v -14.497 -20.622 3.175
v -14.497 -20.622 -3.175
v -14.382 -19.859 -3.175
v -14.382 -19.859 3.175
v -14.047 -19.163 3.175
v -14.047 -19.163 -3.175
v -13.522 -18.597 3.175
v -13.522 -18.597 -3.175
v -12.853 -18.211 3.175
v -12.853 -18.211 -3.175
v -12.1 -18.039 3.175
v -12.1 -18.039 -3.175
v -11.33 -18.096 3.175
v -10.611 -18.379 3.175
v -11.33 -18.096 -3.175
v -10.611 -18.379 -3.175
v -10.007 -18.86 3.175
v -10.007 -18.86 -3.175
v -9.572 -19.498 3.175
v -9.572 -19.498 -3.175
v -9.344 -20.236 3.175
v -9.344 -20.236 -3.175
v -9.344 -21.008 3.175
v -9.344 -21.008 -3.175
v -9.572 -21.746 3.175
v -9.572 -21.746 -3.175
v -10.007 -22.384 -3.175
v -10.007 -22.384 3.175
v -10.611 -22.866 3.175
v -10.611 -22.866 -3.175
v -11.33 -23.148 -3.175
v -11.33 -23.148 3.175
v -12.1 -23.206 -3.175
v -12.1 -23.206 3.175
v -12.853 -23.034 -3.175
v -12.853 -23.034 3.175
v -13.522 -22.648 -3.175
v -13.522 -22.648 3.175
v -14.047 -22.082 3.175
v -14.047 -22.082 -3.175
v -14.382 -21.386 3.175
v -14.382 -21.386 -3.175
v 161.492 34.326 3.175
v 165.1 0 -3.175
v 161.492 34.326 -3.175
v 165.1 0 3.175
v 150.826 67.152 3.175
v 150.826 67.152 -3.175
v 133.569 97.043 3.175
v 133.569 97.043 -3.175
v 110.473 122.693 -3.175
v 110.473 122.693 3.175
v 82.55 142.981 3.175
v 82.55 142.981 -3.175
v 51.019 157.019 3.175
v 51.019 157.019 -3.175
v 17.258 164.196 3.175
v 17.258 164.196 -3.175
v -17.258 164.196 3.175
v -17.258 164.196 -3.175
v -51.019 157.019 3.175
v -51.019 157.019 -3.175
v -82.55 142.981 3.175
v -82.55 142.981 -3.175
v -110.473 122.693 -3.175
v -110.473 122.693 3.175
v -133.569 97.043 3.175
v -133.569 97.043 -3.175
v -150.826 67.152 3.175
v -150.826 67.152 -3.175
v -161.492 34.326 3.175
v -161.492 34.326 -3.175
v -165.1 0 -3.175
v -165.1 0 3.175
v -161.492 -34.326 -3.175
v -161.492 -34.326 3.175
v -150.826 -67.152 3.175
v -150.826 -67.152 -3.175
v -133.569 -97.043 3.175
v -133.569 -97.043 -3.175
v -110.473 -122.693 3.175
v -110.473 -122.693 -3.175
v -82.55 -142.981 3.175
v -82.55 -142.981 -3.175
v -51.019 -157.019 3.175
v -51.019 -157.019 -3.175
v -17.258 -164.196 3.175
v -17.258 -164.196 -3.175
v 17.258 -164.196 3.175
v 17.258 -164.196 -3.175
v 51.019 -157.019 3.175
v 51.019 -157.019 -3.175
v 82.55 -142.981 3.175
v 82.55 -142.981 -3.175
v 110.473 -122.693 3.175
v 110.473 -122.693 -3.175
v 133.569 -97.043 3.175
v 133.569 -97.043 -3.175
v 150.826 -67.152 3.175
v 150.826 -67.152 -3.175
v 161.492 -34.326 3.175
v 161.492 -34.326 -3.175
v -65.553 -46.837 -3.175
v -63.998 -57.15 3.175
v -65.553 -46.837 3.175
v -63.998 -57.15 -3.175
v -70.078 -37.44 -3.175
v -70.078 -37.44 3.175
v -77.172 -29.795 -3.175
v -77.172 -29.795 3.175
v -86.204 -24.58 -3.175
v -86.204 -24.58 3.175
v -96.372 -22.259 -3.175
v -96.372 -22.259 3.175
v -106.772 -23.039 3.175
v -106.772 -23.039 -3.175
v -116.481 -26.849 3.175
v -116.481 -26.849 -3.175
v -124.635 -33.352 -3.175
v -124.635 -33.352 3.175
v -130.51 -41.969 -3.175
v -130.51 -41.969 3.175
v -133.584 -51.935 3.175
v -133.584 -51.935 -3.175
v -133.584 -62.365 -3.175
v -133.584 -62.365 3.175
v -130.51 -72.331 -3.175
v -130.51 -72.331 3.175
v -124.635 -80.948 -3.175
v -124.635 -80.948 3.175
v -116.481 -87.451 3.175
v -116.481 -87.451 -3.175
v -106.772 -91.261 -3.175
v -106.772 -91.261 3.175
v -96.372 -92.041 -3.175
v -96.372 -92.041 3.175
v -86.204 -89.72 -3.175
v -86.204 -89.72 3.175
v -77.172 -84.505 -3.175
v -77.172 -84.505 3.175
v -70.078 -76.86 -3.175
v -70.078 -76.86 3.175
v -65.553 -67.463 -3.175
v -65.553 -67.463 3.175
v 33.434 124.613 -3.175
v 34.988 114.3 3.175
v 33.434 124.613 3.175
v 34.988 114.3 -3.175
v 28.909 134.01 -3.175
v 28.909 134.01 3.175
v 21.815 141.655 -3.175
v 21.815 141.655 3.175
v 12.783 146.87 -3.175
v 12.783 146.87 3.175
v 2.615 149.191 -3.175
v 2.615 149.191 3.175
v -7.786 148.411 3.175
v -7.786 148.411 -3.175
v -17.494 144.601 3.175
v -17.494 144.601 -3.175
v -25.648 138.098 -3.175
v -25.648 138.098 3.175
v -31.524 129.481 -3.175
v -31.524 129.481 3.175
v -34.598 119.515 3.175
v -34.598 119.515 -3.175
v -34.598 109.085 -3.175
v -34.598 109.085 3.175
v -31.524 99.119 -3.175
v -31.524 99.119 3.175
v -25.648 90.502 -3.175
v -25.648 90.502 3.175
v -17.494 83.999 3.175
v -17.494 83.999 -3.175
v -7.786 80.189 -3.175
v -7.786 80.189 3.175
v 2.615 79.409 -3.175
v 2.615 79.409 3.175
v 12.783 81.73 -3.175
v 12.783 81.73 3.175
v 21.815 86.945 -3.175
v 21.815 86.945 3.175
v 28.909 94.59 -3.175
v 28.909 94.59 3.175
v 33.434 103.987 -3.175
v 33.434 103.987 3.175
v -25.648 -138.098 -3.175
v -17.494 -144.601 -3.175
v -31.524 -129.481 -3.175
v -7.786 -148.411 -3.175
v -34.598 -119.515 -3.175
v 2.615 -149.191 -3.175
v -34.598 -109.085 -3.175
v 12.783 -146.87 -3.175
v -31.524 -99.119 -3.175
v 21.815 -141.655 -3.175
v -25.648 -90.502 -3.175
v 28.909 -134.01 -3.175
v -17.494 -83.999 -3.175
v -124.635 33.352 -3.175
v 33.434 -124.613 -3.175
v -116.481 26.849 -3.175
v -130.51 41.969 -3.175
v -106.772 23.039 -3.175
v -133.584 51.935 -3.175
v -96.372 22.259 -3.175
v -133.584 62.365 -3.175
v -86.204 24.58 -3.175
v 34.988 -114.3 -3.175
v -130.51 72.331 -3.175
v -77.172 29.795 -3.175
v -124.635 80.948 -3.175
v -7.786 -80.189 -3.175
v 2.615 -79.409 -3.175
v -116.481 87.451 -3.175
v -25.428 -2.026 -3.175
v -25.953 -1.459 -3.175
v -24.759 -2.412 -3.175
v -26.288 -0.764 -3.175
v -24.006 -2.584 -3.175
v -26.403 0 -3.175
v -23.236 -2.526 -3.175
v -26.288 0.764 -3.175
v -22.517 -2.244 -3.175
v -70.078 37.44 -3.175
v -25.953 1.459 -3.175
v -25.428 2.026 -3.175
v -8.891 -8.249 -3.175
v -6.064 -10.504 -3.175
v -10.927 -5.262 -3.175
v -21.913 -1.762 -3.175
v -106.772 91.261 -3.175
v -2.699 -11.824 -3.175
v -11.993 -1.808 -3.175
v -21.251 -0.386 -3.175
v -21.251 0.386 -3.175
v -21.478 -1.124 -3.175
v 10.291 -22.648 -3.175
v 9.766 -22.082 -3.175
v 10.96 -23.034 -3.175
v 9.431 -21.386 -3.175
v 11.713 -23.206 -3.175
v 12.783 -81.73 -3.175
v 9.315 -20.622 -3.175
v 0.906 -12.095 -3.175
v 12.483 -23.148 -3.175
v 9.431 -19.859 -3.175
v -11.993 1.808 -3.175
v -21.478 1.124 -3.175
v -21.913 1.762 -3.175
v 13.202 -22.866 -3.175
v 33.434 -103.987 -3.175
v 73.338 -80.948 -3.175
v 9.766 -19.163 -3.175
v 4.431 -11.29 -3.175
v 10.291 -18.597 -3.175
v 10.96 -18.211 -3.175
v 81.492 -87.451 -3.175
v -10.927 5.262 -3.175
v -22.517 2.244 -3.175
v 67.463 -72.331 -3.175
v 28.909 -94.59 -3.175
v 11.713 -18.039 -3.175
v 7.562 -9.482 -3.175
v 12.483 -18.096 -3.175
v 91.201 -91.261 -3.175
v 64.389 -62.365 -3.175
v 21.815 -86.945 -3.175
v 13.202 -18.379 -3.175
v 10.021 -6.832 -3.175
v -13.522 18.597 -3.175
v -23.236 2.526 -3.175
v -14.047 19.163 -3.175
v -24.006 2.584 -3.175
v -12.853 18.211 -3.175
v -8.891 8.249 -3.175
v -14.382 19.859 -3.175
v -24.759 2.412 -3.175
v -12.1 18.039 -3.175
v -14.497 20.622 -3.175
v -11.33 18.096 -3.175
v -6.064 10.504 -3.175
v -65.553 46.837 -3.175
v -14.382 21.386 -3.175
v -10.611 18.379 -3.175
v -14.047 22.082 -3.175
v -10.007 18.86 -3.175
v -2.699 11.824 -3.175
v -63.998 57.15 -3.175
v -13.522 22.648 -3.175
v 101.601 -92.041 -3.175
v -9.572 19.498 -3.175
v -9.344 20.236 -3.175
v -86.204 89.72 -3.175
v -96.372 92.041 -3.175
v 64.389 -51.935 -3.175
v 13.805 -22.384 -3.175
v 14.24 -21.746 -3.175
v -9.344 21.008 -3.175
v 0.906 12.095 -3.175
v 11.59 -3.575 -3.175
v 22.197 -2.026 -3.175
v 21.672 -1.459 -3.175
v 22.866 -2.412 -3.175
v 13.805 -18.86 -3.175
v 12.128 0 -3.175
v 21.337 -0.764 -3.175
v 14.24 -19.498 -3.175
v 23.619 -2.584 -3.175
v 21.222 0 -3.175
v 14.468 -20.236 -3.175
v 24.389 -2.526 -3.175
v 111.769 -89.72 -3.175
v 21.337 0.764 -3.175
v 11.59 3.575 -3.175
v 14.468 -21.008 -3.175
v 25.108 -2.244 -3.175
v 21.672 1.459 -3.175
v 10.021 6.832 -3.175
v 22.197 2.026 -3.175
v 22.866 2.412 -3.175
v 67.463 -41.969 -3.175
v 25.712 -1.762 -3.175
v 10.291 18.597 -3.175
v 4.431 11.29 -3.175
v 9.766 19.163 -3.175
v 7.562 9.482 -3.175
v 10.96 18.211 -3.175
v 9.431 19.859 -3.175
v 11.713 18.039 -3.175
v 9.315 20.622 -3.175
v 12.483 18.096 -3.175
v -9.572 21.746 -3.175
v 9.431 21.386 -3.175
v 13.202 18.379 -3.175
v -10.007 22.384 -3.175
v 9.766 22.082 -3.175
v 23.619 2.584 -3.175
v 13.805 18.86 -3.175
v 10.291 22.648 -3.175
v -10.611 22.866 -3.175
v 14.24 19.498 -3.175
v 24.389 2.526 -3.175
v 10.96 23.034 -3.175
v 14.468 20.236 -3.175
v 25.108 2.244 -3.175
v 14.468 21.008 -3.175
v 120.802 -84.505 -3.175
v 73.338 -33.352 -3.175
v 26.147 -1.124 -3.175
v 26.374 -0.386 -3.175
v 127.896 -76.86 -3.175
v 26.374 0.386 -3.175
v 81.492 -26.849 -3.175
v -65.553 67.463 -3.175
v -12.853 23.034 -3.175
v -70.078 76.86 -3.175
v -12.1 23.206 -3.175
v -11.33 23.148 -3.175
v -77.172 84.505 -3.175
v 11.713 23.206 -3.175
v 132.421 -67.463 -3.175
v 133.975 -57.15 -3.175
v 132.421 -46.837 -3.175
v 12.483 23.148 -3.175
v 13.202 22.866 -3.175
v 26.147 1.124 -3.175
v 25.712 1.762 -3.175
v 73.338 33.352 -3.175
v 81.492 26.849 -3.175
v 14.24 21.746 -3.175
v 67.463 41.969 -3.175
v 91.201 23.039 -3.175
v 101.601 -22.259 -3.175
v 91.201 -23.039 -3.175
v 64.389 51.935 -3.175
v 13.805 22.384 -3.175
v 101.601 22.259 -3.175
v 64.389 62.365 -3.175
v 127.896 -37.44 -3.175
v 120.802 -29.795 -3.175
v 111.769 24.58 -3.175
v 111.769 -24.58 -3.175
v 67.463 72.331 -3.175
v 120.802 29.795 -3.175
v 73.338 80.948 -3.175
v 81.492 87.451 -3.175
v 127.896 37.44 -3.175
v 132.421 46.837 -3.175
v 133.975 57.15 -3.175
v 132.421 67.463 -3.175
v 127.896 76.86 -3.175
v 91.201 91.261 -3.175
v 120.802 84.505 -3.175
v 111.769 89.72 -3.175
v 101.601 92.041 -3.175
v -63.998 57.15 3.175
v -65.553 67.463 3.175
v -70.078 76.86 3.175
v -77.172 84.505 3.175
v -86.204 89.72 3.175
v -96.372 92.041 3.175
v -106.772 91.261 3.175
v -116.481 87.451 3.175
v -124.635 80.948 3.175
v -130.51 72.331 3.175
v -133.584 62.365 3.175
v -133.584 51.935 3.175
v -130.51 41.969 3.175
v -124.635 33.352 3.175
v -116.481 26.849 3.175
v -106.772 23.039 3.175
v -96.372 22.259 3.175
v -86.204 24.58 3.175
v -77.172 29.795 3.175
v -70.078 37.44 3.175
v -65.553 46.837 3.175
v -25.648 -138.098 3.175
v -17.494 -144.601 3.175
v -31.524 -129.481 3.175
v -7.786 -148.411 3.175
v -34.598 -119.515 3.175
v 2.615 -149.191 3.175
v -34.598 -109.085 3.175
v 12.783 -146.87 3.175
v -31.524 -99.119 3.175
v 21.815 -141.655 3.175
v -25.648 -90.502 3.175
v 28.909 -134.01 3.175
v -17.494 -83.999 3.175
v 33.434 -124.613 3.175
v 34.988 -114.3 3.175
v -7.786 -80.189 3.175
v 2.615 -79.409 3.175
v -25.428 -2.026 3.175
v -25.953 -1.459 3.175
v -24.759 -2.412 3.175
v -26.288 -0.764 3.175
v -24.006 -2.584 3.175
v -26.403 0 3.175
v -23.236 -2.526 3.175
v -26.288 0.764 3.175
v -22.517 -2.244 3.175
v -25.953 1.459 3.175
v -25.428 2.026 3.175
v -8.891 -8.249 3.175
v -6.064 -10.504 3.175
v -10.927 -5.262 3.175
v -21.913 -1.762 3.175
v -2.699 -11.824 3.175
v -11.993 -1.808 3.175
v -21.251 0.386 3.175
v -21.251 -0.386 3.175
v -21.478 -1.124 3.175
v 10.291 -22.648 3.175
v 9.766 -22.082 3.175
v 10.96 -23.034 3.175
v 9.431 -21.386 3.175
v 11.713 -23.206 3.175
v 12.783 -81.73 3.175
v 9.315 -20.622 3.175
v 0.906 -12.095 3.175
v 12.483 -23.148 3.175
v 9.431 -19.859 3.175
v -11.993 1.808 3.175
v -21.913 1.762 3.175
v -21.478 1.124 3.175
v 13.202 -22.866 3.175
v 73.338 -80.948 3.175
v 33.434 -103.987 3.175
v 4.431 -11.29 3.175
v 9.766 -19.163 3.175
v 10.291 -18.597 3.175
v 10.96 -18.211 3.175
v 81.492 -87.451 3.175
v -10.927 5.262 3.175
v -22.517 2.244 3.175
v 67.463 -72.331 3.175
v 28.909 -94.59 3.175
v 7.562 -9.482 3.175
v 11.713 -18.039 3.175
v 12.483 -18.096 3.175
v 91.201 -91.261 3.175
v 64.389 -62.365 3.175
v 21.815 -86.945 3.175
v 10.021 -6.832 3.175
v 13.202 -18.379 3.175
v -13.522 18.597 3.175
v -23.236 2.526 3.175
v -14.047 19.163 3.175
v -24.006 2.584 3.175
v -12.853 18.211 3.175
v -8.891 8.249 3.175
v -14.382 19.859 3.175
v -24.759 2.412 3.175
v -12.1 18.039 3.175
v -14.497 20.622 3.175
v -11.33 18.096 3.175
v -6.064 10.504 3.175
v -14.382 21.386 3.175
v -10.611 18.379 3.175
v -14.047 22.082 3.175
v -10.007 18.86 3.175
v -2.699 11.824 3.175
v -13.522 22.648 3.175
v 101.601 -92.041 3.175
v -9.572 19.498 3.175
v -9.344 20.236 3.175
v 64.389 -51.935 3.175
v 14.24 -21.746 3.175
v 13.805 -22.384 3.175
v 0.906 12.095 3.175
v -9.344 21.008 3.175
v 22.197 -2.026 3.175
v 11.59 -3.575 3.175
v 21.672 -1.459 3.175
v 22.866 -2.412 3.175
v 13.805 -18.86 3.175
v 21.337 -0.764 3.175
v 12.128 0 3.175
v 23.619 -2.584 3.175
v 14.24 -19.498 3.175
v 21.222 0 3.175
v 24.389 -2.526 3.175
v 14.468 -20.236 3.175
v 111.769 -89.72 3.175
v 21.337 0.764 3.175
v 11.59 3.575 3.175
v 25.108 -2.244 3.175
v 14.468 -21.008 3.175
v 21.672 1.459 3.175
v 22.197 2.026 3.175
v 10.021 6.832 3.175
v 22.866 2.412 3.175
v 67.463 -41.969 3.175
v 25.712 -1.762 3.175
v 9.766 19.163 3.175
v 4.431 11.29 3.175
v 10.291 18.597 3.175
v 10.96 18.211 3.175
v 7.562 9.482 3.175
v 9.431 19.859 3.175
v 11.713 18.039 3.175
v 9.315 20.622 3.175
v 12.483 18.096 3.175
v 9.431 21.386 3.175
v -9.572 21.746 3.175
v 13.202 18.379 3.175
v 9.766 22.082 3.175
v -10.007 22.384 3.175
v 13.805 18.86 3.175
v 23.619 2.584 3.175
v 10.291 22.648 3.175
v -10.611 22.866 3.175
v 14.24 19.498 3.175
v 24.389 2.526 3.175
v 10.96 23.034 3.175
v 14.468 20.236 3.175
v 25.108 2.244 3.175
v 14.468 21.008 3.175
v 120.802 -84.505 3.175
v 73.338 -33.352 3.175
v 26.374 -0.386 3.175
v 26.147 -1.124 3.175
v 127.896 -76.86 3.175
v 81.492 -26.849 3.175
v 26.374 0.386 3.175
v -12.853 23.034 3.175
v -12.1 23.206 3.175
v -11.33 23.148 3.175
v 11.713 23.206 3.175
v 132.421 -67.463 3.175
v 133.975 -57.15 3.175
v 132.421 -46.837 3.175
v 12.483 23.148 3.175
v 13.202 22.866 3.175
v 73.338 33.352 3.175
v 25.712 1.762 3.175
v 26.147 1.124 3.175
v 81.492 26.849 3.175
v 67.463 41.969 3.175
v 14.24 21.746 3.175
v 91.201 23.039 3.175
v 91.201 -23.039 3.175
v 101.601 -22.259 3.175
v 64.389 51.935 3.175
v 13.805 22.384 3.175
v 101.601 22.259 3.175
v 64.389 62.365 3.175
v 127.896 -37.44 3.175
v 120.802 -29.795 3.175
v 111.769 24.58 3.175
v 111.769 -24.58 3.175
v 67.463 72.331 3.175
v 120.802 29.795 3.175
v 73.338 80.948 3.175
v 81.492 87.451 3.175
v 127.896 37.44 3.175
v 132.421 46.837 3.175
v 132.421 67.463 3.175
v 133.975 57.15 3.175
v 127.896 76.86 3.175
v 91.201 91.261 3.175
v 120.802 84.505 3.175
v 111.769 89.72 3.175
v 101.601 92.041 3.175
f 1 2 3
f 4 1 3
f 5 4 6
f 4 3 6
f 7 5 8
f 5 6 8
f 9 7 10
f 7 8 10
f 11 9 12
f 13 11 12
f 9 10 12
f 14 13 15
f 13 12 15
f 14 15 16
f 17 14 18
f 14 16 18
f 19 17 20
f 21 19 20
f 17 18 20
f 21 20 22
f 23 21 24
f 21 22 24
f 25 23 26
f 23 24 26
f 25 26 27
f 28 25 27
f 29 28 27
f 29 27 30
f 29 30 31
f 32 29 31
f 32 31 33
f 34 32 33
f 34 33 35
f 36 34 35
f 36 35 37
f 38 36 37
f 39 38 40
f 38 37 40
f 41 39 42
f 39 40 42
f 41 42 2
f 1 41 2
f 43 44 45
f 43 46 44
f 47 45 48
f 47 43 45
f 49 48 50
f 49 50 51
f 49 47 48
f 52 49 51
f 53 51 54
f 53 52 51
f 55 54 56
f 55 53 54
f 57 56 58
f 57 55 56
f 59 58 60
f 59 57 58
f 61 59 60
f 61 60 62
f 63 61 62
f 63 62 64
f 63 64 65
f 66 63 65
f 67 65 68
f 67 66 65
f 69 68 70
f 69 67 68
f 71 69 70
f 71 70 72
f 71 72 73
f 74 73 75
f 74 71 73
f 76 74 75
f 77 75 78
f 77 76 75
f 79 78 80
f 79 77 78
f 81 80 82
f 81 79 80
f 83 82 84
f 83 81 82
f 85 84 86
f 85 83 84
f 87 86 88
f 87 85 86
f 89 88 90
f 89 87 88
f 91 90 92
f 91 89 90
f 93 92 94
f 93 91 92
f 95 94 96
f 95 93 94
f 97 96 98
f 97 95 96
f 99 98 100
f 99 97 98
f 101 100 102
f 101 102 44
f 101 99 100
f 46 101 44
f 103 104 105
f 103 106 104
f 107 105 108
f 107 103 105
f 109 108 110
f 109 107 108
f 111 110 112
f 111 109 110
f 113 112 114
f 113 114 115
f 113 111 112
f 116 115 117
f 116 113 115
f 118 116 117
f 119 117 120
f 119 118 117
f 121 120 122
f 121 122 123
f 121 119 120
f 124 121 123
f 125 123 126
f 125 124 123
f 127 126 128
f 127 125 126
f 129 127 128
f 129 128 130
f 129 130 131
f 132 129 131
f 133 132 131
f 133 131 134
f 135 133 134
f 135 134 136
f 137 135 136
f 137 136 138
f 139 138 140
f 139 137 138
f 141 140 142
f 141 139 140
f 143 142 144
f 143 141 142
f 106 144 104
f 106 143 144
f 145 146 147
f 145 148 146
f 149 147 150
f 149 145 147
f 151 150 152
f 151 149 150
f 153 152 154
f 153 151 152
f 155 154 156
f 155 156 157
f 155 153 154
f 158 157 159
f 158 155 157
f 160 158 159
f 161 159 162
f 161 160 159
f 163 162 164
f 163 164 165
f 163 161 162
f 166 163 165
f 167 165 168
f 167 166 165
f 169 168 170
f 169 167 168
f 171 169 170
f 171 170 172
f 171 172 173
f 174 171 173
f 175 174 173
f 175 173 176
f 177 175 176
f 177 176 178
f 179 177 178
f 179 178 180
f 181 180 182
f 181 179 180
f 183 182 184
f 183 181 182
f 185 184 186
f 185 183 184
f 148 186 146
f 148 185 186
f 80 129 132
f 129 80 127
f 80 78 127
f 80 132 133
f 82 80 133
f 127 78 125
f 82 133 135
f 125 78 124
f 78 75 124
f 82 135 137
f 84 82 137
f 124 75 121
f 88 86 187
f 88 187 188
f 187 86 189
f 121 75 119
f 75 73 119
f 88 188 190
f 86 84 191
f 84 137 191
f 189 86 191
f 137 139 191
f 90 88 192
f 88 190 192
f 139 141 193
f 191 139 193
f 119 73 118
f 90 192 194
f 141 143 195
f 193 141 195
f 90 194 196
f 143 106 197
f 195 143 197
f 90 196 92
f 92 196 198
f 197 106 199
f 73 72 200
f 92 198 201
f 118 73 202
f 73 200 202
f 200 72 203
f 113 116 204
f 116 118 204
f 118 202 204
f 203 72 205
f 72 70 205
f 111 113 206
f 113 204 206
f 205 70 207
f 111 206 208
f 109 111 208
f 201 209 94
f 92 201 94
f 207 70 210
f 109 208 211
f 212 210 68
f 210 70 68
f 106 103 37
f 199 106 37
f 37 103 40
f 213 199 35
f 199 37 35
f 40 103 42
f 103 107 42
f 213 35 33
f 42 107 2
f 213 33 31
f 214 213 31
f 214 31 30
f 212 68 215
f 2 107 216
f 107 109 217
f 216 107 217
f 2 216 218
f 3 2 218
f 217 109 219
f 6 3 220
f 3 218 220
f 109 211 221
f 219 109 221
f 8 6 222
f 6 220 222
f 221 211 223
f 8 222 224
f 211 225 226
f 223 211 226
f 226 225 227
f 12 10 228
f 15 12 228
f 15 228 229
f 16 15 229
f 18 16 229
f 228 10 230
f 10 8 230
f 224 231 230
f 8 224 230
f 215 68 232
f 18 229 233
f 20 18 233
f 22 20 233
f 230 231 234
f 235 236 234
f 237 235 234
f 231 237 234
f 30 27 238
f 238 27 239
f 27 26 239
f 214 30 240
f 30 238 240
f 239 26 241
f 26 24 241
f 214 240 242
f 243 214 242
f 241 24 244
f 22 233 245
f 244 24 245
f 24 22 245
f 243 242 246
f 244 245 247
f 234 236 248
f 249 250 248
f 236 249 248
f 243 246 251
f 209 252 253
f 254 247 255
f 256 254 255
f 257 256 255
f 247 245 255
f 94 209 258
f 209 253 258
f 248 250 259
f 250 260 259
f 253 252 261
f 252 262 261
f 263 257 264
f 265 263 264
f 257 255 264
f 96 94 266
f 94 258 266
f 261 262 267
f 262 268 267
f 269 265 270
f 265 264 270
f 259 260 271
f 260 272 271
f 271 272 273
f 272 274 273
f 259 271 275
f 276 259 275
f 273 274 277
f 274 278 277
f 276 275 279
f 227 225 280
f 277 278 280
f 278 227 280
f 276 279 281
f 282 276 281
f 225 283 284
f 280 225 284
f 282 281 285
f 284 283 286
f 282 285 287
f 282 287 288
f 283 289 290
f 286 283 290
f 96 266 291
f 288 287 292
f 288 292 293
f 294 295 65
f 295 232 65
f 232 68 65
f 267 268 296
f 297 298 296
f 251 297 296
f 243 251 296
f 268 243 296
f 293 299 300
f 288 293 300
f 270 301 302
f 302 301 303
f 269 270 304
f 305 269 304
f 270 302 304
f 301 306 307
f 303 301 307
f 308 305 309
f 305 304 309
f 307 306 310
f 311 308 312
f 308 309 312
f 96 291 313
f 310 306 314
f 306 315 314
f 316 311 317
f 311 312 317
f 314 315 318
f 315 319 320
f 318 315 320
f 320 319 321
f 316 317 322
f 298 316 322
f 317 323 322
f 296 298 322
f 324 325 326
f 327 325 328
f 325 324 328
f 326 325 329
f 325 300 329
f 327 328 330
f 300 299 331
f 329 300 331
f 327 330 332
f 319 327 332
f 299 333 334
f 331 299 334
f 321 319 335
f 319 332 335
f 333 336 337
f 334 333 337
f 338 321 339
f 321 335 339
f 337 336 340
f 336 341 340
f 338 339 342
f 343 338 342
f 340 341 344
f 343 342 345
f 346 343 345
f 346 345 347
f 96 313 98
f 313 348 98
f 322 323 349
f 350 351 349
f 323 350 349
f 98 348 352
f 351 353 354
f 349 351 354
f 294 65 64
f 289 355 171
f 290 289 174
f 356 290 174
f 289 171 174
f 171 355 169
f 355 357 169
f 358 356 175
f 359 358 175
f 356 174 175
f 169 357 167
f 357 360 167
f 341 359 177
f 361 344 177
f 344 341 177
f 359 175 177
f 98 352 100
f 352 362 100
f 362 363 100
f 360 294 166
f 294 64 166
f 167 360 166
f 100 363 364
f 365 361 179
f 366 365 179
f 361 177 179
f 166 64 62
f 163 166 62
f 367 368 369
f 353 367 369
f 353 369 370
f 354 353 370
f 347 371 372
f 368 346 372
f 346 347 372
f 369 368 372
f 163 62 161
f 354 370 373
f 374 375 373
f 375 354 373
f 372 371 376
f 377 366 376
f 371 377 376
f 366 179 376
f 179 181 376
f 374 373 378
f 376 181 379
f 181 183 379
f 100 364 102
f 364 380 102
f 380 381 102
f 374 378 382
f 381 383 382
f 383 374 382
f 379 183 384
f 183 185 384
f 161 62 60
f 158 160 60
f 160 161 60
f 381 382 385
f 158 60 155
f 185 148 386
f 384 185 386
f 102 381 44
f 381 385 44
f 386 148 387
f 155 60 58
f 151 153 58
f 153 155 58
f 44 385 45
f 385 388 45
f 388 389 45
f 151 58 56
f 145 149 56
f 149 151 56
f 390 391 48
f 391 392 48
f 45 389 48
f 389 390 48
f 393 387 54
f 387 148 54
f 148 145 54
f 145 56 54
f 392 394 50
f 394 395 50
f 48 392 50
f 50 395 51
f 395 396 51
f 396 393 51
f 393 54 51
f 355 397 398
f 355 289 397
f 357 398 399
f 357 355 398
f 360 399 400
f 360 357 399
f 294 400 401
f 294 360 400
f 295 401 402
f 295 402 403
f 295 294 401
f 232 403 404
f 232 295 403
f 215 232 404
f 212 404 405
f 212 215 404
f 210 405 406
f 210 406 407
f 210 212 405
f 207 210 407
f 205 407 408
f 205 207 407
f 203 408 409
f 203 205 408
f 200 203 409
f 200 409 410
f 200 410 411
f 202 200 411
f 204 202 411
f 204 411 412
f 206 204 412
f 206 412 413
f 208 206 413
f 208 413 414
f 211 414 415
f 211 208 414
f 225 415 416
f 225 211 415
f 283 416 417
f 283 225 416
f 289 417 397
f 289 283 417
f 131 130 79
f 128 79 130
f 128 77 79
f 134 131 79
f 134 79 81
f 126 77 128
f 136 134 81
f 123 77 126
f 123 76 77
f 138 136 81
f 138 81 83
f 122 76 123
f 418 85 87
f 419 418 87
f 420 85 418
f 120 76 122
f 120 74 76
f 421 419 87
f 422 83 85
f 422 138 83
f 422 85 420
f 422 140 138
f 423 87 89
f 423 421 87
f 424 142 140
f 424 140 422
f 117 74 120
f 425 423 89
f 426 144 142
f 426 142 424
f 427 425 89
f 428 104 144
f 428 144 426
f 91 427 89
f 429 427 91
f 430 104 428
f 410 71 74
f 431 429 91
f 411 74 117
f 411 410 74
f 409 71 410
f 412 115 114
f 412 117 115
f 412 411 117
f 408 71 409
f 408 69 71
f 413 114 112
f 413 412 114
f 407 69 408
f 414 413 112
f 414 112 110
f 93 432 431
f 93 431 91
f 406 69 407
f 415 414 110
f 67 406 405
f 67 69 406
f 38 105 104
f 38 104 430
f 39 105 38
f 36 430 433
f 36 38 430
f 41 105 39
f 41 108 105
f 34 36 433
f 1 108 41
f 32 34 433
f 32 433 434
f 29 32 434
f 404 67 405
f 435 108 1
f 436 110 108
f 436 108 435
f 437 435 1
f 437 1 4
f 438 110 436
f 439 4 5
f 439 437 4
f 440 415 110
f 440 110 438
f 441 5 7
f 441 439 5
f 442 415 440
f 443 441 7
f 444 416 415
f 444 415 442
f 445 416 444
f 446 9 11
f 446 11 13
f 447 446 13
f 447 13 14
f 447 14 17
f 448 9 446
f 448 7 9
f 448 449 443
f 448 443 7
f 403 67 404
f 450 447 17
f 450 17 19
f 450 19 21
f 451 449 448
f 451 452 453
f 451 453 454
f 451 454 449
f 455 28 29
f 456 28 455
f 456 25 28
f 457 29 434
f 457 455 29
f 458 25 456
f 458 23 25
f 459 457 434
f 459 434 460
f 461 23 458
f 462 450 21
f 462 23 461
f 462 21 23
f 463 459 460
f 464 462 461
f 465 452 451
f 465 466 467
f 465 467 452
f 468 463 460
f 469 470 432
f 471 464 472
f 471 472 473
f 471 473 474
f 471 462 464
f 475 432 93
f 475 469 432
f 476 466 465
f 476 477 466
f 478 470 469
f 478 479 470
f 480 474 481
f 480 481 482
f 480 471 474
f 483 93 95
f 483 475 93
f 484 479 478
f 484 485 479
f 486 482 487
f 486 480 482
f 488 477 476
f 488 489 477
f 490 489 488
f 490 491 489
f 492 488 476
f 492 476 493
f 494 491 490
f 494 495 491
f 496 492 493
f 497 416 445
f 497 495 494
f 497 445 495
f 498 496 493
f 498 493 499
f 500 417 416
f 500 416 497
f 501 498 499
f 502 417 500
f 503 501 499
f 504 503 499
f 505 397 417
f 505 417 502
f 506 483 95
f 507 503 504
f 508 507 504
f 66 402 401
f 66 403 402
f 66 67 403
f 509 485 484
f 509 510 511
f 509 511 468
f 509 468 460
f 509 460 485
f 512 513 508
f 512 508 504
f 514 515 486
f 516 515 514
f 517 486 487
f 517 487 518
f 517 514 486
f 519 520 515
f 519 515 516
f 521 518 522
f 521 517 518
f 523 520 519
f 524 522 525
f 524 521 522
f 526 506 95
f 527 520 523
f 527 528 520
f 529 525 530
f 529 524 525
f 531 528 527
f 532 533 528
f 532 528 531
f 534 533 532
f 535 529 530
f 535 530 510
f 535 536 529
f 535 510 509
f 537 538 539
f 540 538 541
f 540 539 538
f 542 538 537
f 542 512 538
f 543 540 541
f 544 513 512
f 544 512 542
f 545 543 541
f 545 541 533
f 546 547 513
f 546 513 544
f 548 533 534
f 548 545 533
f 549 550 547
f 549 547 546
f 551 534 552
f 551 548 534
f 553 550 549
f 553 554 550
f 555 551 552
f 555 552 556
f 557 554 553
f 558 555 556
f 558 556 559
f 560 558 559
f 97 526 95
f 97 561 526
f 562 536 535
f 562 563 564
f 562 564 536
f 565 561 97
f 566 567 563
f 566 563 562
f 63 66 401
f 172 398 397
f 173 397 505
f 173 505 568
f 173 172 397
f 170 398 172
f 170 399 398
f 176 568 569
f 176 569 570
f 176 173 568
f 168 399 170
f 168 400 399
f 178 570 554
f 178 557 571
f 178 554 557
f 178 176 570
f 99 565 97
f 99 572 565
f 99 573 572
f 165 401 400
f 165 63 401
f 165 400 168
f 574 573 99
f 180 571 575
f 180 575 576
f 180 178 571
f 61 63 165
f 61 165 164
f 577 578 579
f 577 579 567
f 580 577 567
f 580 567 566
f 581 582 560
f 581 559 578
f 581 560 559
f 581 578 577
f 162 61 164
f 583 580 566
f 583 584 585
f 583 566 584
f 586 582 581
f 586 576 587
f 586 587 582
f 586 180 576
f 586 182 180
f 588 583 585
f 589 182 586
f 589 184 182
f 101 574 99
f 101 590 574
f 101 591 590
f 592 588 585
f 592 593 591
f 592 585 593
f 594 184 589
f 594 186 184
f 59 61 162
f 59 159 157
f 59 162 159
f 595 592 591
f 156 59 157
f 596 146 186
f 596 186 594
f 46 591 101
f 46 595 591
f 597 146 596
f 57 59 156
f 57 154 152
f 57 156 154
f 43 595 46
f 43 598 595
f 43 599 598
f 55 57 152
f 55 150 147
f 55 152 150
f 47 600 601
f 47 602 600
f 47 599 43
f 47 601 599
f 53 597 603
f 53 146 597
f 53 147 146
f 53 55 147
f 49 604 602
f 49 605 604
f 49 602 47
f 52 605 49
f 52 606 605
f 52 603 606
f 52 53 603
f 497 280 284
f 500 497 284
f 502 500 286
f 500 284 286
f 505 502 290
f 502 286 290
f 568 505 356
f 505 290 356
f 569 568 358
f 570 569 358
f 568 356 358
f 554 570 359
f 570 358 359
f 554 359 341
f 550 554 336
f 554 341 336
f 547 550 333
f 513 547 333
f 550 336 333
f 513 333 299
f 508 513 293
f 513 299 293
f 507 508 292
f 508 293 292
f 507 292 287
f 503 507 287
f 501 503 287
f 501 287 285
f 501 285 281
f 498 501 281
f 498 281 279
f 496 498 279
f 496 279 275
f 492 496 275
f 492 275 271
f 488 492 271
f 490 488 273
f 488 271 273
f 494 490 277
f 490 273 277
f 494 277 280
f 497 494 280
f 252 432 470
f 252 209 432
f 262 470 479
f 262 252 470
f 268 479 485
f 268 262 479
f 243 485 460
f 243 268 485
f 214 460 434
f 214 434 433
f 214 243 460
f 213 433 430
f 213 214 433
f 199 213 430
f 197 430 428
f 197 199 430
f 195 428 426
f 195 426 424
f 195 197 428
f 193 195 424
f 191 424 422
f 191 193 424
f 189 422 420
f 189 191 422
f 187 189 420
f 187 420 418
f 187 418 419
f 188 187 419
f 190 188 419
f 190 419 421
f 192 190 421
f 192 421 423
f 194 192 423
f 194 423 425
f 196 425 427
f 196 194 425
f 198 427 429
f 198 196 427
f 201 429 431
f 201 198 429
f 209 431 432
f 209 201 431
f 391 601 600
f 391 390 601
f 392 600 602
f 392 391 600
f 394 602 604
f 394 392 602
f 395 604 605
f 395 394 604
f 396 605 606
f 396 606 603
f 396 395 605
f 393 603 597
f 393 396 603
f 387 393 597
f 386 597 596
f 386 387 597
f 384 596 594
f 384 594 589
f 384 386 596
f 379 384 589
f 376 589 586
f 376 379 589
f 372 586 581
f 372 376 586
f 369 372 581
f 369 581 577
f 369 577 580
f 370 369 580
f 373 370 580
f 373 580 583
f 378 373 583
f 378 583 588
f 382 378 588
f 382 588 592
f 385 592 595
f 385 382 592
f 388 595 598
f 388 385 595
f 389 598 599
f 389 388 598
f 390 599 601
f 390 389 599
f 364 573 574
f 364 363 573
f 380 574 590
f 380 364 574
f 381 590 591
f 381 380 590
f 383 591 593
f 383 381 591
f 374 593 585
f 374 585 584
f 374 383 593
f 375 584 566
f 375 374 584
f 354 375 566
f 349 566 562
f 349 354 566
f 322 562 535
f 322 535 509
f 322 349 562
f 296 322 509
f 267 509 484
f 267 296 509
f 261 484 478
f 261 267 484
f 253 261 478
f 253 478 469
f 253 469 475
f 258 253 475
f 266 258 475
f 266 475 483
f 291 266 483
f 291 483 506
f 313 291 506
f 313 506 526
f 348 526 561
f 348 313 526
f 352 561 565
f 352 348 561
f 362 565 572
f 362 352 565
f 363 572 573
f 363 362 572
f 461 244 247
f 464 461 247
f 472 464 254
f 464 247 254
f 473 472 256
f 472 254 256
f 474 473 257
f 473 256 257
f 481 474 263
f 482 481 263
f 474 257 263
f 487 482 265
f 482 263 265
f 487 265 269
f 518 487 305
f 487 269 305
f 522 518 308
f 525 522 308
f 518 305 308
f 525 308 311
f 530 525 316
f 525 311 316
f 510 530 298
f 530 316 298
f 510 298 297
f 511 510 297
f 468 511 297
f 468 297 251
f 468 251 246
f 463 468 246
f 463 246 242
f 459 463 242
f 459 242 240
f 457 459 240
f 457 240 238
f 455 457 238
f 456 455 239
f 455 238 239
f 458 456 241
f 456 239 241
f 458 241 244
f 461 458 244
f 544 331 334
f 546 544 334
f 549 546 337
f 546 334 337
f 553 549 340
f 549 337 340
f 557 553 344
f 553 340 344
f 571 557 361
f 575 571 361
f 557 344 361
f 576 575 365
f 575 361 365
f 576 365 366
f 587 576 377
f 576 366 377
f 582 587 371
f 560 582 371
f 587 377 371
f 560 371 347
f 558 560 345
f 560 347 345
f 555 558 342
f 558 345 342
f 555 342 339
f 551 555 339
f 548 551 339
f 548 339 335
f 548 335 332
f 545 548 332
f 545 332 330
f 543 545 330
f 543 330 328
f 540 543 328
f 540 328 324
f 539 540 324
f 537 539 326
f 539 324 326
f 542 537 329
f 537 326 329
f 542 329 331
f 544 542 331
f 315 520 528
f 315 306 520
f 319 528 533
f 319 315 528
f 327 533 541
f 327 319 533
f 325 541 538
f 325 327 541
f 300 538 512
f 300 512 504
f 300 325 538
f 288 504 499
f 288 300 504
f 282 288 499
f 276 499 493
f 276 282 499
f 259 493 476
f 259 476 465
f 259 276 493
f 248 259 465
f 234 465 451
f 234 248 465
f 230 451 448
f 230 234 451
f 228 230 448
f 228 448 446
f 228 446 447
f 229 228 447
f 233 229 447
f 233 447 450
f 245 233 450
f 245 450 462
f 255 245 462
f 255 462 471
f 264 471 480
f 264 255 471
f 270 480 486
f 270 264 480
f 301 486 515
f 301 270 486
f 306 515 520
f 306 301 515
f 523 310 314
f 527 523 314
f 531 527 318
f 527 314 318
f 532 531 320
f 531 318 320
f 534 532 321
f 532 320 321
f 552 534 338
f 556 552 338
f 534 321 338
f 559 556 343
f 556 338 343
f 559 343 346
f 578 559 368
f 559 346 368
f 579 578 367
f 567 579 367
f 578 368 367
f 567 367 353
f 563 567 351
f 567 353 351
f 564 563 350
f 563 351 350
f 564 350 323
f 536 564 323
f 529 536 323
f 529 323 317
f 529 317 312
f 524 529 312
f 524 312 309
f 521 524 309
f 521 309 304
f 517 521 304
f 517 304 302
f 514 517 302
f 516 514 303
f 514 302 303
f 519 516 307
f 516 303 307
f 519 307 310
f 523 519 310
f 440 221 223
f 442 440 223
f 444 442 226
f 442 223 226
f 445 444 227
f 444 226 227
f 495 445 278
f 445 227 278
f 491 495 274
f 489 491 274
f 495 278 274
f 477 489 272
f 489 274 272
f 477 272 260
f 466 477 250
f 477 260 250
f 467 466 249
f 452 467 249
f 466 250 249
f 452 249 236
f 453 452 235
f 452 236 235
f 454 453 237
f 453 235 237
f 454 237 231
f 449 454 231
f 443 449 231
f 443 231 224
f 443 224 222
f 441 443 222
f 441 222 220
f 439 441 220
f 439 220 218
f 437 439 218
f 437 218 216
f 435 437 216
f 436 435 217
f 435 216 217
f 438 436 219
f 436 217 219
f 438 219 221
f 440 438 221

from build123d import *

# Parameters (mm, degrees)
SKETCH1_R           = 165.1
SKETCH1_R_2         = 34.9885
SKETCH1_R_3         = 12.1285
BOSS_EXTRUDE1_DEPTH = 3.175
SKETCH2_R           = 2.5908
CUT_EXTRUDE1_DEPTH  = 6.35


with BuildPart() as part:
    # Sketch1 → Boss-Extrude1 (new, symmetric)
    with BuildSketch(Plane.XY):
        Circle(SKETCH1_R)
        with Locations((0, 114.3)):
            Circle(SKETCH1_R_2, mode=Mode.SUBTRACT)
        with Locations((98.986703653, 57.15)):
            Circle(SKETCH1_R_2, mode=Mode.SUBTRACT)
        with Locations((98.986703653, -57.15)):
            Circle(SKETCH1_R_2, mode=Mode.SUBTRACT)
        with Locations((0, -114.3)):
            Circle(SKETCH1_R_2, mode=Mode.SUBTRACT)
        with Locations((-98.986703653, -57.15)):
            Circle(SKETCH1_R_2, mode=Mode.SUBTRACT)
        with Locations((-98.986703653, 57.15)):
            Circle(SKETCH1_R_2, mode=Mode.SUBTRACT)
        Circle(SKETCH1_R_3, mode=Mode.SUBTRACT)
    extrude(amount=BOSS_EXTRUDE1_DEPTH, both=True)

    # Sketch2 → Cut-Extrude1 (cut)
    with BuildSketch(Plane(origin=(0, 0, -3.175), x_dir=(-1, 0, 0), z_dir=(0, 0, -1))):
        with Locations((-23.8125, 0)):
            Circle(SKETCH2_R)
        with Locations((-11.90625, 20.622229928)):
            Circle(SKETCH2_R)
        with Locations((11.90625, 20.622229928)):
            Circle(SKETCH2_R)
        with Locations((23.8125, 0)):
            Circle(SKETCH2_R)
        with Locations((11.90625, -20.622229928)):
            Circle(SKETCH2_R)
        with Locations((-11.90625, -20.622229928)):
            Circle(SKETCH2_R)
    extrude(amount=-CUT_EXTRUDE1_DEPTH, mode=Mode.SUBTRACT)


solid = part.part
